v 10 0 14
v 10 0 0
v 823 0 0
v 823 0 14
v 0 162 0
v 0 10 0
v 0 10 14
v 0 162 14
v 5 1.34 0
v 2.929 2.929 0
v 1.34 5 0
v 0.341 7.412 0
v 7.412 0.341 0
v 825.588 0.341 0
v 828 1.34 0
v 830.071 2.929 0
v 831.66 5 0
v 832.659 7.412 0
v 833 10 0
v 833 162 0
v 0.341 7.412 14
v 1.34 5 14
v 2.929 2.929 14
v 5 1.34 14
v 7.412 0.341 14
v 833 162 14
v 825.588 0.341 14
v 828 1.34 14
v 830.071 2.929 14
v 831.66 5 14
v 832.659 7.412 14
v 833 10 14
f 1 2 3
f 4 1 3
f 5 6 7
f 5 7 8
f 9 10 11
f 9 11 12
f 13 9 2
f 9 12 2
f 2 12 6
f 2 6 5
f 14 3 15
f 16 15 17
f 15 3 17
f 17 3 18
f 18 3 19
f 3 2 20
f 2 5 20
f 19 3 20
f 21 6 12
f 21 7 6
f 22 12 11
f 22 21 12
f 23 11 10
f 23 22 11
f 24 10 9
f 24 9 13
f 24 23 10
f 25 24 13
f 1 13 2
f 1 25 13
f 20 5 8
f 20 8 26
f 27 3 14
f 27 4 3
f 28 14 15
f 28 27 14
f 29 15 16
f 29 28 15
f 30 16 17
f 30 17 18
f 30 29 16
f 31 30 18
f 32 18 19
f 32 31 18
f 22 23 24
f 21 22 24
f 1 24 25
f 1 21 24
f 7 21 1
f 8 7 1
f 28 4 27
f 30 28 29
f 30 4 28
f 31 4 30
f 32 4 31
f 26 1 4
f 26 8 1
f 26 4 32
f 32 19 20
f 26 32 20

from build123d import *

# Parameters (mm, degrees)
BOX_W       = 833
BOX_H       = 162
BOX_DEPTH   = 14
FILLET_R    = 10
FILLET001_R = 10


with BuildPart() as part:
    # Box → Box (new body)
    with BuildSketch(Plane.XY):
        with Locations((416.5, 81)):
            Rectangle(BOX_W, BOX_H)
    extrude(amount=BOX_DEPTH)

    # Fillet
    fillet_edges = [part.edges().sort_by_distance(p)[0] for p in [
        (0, 0, 7),
    ]]
    fillet(fillet_edges, radius=FILLET_R)

    # Fillet001
    fillet001_edges = [part.edges().sort_by_distance(p)[0] for p in [
        (833, 0, 7),
    ]]
    fillet(fillet001_edges, radius=FILLET001_R)


solid = part.part
